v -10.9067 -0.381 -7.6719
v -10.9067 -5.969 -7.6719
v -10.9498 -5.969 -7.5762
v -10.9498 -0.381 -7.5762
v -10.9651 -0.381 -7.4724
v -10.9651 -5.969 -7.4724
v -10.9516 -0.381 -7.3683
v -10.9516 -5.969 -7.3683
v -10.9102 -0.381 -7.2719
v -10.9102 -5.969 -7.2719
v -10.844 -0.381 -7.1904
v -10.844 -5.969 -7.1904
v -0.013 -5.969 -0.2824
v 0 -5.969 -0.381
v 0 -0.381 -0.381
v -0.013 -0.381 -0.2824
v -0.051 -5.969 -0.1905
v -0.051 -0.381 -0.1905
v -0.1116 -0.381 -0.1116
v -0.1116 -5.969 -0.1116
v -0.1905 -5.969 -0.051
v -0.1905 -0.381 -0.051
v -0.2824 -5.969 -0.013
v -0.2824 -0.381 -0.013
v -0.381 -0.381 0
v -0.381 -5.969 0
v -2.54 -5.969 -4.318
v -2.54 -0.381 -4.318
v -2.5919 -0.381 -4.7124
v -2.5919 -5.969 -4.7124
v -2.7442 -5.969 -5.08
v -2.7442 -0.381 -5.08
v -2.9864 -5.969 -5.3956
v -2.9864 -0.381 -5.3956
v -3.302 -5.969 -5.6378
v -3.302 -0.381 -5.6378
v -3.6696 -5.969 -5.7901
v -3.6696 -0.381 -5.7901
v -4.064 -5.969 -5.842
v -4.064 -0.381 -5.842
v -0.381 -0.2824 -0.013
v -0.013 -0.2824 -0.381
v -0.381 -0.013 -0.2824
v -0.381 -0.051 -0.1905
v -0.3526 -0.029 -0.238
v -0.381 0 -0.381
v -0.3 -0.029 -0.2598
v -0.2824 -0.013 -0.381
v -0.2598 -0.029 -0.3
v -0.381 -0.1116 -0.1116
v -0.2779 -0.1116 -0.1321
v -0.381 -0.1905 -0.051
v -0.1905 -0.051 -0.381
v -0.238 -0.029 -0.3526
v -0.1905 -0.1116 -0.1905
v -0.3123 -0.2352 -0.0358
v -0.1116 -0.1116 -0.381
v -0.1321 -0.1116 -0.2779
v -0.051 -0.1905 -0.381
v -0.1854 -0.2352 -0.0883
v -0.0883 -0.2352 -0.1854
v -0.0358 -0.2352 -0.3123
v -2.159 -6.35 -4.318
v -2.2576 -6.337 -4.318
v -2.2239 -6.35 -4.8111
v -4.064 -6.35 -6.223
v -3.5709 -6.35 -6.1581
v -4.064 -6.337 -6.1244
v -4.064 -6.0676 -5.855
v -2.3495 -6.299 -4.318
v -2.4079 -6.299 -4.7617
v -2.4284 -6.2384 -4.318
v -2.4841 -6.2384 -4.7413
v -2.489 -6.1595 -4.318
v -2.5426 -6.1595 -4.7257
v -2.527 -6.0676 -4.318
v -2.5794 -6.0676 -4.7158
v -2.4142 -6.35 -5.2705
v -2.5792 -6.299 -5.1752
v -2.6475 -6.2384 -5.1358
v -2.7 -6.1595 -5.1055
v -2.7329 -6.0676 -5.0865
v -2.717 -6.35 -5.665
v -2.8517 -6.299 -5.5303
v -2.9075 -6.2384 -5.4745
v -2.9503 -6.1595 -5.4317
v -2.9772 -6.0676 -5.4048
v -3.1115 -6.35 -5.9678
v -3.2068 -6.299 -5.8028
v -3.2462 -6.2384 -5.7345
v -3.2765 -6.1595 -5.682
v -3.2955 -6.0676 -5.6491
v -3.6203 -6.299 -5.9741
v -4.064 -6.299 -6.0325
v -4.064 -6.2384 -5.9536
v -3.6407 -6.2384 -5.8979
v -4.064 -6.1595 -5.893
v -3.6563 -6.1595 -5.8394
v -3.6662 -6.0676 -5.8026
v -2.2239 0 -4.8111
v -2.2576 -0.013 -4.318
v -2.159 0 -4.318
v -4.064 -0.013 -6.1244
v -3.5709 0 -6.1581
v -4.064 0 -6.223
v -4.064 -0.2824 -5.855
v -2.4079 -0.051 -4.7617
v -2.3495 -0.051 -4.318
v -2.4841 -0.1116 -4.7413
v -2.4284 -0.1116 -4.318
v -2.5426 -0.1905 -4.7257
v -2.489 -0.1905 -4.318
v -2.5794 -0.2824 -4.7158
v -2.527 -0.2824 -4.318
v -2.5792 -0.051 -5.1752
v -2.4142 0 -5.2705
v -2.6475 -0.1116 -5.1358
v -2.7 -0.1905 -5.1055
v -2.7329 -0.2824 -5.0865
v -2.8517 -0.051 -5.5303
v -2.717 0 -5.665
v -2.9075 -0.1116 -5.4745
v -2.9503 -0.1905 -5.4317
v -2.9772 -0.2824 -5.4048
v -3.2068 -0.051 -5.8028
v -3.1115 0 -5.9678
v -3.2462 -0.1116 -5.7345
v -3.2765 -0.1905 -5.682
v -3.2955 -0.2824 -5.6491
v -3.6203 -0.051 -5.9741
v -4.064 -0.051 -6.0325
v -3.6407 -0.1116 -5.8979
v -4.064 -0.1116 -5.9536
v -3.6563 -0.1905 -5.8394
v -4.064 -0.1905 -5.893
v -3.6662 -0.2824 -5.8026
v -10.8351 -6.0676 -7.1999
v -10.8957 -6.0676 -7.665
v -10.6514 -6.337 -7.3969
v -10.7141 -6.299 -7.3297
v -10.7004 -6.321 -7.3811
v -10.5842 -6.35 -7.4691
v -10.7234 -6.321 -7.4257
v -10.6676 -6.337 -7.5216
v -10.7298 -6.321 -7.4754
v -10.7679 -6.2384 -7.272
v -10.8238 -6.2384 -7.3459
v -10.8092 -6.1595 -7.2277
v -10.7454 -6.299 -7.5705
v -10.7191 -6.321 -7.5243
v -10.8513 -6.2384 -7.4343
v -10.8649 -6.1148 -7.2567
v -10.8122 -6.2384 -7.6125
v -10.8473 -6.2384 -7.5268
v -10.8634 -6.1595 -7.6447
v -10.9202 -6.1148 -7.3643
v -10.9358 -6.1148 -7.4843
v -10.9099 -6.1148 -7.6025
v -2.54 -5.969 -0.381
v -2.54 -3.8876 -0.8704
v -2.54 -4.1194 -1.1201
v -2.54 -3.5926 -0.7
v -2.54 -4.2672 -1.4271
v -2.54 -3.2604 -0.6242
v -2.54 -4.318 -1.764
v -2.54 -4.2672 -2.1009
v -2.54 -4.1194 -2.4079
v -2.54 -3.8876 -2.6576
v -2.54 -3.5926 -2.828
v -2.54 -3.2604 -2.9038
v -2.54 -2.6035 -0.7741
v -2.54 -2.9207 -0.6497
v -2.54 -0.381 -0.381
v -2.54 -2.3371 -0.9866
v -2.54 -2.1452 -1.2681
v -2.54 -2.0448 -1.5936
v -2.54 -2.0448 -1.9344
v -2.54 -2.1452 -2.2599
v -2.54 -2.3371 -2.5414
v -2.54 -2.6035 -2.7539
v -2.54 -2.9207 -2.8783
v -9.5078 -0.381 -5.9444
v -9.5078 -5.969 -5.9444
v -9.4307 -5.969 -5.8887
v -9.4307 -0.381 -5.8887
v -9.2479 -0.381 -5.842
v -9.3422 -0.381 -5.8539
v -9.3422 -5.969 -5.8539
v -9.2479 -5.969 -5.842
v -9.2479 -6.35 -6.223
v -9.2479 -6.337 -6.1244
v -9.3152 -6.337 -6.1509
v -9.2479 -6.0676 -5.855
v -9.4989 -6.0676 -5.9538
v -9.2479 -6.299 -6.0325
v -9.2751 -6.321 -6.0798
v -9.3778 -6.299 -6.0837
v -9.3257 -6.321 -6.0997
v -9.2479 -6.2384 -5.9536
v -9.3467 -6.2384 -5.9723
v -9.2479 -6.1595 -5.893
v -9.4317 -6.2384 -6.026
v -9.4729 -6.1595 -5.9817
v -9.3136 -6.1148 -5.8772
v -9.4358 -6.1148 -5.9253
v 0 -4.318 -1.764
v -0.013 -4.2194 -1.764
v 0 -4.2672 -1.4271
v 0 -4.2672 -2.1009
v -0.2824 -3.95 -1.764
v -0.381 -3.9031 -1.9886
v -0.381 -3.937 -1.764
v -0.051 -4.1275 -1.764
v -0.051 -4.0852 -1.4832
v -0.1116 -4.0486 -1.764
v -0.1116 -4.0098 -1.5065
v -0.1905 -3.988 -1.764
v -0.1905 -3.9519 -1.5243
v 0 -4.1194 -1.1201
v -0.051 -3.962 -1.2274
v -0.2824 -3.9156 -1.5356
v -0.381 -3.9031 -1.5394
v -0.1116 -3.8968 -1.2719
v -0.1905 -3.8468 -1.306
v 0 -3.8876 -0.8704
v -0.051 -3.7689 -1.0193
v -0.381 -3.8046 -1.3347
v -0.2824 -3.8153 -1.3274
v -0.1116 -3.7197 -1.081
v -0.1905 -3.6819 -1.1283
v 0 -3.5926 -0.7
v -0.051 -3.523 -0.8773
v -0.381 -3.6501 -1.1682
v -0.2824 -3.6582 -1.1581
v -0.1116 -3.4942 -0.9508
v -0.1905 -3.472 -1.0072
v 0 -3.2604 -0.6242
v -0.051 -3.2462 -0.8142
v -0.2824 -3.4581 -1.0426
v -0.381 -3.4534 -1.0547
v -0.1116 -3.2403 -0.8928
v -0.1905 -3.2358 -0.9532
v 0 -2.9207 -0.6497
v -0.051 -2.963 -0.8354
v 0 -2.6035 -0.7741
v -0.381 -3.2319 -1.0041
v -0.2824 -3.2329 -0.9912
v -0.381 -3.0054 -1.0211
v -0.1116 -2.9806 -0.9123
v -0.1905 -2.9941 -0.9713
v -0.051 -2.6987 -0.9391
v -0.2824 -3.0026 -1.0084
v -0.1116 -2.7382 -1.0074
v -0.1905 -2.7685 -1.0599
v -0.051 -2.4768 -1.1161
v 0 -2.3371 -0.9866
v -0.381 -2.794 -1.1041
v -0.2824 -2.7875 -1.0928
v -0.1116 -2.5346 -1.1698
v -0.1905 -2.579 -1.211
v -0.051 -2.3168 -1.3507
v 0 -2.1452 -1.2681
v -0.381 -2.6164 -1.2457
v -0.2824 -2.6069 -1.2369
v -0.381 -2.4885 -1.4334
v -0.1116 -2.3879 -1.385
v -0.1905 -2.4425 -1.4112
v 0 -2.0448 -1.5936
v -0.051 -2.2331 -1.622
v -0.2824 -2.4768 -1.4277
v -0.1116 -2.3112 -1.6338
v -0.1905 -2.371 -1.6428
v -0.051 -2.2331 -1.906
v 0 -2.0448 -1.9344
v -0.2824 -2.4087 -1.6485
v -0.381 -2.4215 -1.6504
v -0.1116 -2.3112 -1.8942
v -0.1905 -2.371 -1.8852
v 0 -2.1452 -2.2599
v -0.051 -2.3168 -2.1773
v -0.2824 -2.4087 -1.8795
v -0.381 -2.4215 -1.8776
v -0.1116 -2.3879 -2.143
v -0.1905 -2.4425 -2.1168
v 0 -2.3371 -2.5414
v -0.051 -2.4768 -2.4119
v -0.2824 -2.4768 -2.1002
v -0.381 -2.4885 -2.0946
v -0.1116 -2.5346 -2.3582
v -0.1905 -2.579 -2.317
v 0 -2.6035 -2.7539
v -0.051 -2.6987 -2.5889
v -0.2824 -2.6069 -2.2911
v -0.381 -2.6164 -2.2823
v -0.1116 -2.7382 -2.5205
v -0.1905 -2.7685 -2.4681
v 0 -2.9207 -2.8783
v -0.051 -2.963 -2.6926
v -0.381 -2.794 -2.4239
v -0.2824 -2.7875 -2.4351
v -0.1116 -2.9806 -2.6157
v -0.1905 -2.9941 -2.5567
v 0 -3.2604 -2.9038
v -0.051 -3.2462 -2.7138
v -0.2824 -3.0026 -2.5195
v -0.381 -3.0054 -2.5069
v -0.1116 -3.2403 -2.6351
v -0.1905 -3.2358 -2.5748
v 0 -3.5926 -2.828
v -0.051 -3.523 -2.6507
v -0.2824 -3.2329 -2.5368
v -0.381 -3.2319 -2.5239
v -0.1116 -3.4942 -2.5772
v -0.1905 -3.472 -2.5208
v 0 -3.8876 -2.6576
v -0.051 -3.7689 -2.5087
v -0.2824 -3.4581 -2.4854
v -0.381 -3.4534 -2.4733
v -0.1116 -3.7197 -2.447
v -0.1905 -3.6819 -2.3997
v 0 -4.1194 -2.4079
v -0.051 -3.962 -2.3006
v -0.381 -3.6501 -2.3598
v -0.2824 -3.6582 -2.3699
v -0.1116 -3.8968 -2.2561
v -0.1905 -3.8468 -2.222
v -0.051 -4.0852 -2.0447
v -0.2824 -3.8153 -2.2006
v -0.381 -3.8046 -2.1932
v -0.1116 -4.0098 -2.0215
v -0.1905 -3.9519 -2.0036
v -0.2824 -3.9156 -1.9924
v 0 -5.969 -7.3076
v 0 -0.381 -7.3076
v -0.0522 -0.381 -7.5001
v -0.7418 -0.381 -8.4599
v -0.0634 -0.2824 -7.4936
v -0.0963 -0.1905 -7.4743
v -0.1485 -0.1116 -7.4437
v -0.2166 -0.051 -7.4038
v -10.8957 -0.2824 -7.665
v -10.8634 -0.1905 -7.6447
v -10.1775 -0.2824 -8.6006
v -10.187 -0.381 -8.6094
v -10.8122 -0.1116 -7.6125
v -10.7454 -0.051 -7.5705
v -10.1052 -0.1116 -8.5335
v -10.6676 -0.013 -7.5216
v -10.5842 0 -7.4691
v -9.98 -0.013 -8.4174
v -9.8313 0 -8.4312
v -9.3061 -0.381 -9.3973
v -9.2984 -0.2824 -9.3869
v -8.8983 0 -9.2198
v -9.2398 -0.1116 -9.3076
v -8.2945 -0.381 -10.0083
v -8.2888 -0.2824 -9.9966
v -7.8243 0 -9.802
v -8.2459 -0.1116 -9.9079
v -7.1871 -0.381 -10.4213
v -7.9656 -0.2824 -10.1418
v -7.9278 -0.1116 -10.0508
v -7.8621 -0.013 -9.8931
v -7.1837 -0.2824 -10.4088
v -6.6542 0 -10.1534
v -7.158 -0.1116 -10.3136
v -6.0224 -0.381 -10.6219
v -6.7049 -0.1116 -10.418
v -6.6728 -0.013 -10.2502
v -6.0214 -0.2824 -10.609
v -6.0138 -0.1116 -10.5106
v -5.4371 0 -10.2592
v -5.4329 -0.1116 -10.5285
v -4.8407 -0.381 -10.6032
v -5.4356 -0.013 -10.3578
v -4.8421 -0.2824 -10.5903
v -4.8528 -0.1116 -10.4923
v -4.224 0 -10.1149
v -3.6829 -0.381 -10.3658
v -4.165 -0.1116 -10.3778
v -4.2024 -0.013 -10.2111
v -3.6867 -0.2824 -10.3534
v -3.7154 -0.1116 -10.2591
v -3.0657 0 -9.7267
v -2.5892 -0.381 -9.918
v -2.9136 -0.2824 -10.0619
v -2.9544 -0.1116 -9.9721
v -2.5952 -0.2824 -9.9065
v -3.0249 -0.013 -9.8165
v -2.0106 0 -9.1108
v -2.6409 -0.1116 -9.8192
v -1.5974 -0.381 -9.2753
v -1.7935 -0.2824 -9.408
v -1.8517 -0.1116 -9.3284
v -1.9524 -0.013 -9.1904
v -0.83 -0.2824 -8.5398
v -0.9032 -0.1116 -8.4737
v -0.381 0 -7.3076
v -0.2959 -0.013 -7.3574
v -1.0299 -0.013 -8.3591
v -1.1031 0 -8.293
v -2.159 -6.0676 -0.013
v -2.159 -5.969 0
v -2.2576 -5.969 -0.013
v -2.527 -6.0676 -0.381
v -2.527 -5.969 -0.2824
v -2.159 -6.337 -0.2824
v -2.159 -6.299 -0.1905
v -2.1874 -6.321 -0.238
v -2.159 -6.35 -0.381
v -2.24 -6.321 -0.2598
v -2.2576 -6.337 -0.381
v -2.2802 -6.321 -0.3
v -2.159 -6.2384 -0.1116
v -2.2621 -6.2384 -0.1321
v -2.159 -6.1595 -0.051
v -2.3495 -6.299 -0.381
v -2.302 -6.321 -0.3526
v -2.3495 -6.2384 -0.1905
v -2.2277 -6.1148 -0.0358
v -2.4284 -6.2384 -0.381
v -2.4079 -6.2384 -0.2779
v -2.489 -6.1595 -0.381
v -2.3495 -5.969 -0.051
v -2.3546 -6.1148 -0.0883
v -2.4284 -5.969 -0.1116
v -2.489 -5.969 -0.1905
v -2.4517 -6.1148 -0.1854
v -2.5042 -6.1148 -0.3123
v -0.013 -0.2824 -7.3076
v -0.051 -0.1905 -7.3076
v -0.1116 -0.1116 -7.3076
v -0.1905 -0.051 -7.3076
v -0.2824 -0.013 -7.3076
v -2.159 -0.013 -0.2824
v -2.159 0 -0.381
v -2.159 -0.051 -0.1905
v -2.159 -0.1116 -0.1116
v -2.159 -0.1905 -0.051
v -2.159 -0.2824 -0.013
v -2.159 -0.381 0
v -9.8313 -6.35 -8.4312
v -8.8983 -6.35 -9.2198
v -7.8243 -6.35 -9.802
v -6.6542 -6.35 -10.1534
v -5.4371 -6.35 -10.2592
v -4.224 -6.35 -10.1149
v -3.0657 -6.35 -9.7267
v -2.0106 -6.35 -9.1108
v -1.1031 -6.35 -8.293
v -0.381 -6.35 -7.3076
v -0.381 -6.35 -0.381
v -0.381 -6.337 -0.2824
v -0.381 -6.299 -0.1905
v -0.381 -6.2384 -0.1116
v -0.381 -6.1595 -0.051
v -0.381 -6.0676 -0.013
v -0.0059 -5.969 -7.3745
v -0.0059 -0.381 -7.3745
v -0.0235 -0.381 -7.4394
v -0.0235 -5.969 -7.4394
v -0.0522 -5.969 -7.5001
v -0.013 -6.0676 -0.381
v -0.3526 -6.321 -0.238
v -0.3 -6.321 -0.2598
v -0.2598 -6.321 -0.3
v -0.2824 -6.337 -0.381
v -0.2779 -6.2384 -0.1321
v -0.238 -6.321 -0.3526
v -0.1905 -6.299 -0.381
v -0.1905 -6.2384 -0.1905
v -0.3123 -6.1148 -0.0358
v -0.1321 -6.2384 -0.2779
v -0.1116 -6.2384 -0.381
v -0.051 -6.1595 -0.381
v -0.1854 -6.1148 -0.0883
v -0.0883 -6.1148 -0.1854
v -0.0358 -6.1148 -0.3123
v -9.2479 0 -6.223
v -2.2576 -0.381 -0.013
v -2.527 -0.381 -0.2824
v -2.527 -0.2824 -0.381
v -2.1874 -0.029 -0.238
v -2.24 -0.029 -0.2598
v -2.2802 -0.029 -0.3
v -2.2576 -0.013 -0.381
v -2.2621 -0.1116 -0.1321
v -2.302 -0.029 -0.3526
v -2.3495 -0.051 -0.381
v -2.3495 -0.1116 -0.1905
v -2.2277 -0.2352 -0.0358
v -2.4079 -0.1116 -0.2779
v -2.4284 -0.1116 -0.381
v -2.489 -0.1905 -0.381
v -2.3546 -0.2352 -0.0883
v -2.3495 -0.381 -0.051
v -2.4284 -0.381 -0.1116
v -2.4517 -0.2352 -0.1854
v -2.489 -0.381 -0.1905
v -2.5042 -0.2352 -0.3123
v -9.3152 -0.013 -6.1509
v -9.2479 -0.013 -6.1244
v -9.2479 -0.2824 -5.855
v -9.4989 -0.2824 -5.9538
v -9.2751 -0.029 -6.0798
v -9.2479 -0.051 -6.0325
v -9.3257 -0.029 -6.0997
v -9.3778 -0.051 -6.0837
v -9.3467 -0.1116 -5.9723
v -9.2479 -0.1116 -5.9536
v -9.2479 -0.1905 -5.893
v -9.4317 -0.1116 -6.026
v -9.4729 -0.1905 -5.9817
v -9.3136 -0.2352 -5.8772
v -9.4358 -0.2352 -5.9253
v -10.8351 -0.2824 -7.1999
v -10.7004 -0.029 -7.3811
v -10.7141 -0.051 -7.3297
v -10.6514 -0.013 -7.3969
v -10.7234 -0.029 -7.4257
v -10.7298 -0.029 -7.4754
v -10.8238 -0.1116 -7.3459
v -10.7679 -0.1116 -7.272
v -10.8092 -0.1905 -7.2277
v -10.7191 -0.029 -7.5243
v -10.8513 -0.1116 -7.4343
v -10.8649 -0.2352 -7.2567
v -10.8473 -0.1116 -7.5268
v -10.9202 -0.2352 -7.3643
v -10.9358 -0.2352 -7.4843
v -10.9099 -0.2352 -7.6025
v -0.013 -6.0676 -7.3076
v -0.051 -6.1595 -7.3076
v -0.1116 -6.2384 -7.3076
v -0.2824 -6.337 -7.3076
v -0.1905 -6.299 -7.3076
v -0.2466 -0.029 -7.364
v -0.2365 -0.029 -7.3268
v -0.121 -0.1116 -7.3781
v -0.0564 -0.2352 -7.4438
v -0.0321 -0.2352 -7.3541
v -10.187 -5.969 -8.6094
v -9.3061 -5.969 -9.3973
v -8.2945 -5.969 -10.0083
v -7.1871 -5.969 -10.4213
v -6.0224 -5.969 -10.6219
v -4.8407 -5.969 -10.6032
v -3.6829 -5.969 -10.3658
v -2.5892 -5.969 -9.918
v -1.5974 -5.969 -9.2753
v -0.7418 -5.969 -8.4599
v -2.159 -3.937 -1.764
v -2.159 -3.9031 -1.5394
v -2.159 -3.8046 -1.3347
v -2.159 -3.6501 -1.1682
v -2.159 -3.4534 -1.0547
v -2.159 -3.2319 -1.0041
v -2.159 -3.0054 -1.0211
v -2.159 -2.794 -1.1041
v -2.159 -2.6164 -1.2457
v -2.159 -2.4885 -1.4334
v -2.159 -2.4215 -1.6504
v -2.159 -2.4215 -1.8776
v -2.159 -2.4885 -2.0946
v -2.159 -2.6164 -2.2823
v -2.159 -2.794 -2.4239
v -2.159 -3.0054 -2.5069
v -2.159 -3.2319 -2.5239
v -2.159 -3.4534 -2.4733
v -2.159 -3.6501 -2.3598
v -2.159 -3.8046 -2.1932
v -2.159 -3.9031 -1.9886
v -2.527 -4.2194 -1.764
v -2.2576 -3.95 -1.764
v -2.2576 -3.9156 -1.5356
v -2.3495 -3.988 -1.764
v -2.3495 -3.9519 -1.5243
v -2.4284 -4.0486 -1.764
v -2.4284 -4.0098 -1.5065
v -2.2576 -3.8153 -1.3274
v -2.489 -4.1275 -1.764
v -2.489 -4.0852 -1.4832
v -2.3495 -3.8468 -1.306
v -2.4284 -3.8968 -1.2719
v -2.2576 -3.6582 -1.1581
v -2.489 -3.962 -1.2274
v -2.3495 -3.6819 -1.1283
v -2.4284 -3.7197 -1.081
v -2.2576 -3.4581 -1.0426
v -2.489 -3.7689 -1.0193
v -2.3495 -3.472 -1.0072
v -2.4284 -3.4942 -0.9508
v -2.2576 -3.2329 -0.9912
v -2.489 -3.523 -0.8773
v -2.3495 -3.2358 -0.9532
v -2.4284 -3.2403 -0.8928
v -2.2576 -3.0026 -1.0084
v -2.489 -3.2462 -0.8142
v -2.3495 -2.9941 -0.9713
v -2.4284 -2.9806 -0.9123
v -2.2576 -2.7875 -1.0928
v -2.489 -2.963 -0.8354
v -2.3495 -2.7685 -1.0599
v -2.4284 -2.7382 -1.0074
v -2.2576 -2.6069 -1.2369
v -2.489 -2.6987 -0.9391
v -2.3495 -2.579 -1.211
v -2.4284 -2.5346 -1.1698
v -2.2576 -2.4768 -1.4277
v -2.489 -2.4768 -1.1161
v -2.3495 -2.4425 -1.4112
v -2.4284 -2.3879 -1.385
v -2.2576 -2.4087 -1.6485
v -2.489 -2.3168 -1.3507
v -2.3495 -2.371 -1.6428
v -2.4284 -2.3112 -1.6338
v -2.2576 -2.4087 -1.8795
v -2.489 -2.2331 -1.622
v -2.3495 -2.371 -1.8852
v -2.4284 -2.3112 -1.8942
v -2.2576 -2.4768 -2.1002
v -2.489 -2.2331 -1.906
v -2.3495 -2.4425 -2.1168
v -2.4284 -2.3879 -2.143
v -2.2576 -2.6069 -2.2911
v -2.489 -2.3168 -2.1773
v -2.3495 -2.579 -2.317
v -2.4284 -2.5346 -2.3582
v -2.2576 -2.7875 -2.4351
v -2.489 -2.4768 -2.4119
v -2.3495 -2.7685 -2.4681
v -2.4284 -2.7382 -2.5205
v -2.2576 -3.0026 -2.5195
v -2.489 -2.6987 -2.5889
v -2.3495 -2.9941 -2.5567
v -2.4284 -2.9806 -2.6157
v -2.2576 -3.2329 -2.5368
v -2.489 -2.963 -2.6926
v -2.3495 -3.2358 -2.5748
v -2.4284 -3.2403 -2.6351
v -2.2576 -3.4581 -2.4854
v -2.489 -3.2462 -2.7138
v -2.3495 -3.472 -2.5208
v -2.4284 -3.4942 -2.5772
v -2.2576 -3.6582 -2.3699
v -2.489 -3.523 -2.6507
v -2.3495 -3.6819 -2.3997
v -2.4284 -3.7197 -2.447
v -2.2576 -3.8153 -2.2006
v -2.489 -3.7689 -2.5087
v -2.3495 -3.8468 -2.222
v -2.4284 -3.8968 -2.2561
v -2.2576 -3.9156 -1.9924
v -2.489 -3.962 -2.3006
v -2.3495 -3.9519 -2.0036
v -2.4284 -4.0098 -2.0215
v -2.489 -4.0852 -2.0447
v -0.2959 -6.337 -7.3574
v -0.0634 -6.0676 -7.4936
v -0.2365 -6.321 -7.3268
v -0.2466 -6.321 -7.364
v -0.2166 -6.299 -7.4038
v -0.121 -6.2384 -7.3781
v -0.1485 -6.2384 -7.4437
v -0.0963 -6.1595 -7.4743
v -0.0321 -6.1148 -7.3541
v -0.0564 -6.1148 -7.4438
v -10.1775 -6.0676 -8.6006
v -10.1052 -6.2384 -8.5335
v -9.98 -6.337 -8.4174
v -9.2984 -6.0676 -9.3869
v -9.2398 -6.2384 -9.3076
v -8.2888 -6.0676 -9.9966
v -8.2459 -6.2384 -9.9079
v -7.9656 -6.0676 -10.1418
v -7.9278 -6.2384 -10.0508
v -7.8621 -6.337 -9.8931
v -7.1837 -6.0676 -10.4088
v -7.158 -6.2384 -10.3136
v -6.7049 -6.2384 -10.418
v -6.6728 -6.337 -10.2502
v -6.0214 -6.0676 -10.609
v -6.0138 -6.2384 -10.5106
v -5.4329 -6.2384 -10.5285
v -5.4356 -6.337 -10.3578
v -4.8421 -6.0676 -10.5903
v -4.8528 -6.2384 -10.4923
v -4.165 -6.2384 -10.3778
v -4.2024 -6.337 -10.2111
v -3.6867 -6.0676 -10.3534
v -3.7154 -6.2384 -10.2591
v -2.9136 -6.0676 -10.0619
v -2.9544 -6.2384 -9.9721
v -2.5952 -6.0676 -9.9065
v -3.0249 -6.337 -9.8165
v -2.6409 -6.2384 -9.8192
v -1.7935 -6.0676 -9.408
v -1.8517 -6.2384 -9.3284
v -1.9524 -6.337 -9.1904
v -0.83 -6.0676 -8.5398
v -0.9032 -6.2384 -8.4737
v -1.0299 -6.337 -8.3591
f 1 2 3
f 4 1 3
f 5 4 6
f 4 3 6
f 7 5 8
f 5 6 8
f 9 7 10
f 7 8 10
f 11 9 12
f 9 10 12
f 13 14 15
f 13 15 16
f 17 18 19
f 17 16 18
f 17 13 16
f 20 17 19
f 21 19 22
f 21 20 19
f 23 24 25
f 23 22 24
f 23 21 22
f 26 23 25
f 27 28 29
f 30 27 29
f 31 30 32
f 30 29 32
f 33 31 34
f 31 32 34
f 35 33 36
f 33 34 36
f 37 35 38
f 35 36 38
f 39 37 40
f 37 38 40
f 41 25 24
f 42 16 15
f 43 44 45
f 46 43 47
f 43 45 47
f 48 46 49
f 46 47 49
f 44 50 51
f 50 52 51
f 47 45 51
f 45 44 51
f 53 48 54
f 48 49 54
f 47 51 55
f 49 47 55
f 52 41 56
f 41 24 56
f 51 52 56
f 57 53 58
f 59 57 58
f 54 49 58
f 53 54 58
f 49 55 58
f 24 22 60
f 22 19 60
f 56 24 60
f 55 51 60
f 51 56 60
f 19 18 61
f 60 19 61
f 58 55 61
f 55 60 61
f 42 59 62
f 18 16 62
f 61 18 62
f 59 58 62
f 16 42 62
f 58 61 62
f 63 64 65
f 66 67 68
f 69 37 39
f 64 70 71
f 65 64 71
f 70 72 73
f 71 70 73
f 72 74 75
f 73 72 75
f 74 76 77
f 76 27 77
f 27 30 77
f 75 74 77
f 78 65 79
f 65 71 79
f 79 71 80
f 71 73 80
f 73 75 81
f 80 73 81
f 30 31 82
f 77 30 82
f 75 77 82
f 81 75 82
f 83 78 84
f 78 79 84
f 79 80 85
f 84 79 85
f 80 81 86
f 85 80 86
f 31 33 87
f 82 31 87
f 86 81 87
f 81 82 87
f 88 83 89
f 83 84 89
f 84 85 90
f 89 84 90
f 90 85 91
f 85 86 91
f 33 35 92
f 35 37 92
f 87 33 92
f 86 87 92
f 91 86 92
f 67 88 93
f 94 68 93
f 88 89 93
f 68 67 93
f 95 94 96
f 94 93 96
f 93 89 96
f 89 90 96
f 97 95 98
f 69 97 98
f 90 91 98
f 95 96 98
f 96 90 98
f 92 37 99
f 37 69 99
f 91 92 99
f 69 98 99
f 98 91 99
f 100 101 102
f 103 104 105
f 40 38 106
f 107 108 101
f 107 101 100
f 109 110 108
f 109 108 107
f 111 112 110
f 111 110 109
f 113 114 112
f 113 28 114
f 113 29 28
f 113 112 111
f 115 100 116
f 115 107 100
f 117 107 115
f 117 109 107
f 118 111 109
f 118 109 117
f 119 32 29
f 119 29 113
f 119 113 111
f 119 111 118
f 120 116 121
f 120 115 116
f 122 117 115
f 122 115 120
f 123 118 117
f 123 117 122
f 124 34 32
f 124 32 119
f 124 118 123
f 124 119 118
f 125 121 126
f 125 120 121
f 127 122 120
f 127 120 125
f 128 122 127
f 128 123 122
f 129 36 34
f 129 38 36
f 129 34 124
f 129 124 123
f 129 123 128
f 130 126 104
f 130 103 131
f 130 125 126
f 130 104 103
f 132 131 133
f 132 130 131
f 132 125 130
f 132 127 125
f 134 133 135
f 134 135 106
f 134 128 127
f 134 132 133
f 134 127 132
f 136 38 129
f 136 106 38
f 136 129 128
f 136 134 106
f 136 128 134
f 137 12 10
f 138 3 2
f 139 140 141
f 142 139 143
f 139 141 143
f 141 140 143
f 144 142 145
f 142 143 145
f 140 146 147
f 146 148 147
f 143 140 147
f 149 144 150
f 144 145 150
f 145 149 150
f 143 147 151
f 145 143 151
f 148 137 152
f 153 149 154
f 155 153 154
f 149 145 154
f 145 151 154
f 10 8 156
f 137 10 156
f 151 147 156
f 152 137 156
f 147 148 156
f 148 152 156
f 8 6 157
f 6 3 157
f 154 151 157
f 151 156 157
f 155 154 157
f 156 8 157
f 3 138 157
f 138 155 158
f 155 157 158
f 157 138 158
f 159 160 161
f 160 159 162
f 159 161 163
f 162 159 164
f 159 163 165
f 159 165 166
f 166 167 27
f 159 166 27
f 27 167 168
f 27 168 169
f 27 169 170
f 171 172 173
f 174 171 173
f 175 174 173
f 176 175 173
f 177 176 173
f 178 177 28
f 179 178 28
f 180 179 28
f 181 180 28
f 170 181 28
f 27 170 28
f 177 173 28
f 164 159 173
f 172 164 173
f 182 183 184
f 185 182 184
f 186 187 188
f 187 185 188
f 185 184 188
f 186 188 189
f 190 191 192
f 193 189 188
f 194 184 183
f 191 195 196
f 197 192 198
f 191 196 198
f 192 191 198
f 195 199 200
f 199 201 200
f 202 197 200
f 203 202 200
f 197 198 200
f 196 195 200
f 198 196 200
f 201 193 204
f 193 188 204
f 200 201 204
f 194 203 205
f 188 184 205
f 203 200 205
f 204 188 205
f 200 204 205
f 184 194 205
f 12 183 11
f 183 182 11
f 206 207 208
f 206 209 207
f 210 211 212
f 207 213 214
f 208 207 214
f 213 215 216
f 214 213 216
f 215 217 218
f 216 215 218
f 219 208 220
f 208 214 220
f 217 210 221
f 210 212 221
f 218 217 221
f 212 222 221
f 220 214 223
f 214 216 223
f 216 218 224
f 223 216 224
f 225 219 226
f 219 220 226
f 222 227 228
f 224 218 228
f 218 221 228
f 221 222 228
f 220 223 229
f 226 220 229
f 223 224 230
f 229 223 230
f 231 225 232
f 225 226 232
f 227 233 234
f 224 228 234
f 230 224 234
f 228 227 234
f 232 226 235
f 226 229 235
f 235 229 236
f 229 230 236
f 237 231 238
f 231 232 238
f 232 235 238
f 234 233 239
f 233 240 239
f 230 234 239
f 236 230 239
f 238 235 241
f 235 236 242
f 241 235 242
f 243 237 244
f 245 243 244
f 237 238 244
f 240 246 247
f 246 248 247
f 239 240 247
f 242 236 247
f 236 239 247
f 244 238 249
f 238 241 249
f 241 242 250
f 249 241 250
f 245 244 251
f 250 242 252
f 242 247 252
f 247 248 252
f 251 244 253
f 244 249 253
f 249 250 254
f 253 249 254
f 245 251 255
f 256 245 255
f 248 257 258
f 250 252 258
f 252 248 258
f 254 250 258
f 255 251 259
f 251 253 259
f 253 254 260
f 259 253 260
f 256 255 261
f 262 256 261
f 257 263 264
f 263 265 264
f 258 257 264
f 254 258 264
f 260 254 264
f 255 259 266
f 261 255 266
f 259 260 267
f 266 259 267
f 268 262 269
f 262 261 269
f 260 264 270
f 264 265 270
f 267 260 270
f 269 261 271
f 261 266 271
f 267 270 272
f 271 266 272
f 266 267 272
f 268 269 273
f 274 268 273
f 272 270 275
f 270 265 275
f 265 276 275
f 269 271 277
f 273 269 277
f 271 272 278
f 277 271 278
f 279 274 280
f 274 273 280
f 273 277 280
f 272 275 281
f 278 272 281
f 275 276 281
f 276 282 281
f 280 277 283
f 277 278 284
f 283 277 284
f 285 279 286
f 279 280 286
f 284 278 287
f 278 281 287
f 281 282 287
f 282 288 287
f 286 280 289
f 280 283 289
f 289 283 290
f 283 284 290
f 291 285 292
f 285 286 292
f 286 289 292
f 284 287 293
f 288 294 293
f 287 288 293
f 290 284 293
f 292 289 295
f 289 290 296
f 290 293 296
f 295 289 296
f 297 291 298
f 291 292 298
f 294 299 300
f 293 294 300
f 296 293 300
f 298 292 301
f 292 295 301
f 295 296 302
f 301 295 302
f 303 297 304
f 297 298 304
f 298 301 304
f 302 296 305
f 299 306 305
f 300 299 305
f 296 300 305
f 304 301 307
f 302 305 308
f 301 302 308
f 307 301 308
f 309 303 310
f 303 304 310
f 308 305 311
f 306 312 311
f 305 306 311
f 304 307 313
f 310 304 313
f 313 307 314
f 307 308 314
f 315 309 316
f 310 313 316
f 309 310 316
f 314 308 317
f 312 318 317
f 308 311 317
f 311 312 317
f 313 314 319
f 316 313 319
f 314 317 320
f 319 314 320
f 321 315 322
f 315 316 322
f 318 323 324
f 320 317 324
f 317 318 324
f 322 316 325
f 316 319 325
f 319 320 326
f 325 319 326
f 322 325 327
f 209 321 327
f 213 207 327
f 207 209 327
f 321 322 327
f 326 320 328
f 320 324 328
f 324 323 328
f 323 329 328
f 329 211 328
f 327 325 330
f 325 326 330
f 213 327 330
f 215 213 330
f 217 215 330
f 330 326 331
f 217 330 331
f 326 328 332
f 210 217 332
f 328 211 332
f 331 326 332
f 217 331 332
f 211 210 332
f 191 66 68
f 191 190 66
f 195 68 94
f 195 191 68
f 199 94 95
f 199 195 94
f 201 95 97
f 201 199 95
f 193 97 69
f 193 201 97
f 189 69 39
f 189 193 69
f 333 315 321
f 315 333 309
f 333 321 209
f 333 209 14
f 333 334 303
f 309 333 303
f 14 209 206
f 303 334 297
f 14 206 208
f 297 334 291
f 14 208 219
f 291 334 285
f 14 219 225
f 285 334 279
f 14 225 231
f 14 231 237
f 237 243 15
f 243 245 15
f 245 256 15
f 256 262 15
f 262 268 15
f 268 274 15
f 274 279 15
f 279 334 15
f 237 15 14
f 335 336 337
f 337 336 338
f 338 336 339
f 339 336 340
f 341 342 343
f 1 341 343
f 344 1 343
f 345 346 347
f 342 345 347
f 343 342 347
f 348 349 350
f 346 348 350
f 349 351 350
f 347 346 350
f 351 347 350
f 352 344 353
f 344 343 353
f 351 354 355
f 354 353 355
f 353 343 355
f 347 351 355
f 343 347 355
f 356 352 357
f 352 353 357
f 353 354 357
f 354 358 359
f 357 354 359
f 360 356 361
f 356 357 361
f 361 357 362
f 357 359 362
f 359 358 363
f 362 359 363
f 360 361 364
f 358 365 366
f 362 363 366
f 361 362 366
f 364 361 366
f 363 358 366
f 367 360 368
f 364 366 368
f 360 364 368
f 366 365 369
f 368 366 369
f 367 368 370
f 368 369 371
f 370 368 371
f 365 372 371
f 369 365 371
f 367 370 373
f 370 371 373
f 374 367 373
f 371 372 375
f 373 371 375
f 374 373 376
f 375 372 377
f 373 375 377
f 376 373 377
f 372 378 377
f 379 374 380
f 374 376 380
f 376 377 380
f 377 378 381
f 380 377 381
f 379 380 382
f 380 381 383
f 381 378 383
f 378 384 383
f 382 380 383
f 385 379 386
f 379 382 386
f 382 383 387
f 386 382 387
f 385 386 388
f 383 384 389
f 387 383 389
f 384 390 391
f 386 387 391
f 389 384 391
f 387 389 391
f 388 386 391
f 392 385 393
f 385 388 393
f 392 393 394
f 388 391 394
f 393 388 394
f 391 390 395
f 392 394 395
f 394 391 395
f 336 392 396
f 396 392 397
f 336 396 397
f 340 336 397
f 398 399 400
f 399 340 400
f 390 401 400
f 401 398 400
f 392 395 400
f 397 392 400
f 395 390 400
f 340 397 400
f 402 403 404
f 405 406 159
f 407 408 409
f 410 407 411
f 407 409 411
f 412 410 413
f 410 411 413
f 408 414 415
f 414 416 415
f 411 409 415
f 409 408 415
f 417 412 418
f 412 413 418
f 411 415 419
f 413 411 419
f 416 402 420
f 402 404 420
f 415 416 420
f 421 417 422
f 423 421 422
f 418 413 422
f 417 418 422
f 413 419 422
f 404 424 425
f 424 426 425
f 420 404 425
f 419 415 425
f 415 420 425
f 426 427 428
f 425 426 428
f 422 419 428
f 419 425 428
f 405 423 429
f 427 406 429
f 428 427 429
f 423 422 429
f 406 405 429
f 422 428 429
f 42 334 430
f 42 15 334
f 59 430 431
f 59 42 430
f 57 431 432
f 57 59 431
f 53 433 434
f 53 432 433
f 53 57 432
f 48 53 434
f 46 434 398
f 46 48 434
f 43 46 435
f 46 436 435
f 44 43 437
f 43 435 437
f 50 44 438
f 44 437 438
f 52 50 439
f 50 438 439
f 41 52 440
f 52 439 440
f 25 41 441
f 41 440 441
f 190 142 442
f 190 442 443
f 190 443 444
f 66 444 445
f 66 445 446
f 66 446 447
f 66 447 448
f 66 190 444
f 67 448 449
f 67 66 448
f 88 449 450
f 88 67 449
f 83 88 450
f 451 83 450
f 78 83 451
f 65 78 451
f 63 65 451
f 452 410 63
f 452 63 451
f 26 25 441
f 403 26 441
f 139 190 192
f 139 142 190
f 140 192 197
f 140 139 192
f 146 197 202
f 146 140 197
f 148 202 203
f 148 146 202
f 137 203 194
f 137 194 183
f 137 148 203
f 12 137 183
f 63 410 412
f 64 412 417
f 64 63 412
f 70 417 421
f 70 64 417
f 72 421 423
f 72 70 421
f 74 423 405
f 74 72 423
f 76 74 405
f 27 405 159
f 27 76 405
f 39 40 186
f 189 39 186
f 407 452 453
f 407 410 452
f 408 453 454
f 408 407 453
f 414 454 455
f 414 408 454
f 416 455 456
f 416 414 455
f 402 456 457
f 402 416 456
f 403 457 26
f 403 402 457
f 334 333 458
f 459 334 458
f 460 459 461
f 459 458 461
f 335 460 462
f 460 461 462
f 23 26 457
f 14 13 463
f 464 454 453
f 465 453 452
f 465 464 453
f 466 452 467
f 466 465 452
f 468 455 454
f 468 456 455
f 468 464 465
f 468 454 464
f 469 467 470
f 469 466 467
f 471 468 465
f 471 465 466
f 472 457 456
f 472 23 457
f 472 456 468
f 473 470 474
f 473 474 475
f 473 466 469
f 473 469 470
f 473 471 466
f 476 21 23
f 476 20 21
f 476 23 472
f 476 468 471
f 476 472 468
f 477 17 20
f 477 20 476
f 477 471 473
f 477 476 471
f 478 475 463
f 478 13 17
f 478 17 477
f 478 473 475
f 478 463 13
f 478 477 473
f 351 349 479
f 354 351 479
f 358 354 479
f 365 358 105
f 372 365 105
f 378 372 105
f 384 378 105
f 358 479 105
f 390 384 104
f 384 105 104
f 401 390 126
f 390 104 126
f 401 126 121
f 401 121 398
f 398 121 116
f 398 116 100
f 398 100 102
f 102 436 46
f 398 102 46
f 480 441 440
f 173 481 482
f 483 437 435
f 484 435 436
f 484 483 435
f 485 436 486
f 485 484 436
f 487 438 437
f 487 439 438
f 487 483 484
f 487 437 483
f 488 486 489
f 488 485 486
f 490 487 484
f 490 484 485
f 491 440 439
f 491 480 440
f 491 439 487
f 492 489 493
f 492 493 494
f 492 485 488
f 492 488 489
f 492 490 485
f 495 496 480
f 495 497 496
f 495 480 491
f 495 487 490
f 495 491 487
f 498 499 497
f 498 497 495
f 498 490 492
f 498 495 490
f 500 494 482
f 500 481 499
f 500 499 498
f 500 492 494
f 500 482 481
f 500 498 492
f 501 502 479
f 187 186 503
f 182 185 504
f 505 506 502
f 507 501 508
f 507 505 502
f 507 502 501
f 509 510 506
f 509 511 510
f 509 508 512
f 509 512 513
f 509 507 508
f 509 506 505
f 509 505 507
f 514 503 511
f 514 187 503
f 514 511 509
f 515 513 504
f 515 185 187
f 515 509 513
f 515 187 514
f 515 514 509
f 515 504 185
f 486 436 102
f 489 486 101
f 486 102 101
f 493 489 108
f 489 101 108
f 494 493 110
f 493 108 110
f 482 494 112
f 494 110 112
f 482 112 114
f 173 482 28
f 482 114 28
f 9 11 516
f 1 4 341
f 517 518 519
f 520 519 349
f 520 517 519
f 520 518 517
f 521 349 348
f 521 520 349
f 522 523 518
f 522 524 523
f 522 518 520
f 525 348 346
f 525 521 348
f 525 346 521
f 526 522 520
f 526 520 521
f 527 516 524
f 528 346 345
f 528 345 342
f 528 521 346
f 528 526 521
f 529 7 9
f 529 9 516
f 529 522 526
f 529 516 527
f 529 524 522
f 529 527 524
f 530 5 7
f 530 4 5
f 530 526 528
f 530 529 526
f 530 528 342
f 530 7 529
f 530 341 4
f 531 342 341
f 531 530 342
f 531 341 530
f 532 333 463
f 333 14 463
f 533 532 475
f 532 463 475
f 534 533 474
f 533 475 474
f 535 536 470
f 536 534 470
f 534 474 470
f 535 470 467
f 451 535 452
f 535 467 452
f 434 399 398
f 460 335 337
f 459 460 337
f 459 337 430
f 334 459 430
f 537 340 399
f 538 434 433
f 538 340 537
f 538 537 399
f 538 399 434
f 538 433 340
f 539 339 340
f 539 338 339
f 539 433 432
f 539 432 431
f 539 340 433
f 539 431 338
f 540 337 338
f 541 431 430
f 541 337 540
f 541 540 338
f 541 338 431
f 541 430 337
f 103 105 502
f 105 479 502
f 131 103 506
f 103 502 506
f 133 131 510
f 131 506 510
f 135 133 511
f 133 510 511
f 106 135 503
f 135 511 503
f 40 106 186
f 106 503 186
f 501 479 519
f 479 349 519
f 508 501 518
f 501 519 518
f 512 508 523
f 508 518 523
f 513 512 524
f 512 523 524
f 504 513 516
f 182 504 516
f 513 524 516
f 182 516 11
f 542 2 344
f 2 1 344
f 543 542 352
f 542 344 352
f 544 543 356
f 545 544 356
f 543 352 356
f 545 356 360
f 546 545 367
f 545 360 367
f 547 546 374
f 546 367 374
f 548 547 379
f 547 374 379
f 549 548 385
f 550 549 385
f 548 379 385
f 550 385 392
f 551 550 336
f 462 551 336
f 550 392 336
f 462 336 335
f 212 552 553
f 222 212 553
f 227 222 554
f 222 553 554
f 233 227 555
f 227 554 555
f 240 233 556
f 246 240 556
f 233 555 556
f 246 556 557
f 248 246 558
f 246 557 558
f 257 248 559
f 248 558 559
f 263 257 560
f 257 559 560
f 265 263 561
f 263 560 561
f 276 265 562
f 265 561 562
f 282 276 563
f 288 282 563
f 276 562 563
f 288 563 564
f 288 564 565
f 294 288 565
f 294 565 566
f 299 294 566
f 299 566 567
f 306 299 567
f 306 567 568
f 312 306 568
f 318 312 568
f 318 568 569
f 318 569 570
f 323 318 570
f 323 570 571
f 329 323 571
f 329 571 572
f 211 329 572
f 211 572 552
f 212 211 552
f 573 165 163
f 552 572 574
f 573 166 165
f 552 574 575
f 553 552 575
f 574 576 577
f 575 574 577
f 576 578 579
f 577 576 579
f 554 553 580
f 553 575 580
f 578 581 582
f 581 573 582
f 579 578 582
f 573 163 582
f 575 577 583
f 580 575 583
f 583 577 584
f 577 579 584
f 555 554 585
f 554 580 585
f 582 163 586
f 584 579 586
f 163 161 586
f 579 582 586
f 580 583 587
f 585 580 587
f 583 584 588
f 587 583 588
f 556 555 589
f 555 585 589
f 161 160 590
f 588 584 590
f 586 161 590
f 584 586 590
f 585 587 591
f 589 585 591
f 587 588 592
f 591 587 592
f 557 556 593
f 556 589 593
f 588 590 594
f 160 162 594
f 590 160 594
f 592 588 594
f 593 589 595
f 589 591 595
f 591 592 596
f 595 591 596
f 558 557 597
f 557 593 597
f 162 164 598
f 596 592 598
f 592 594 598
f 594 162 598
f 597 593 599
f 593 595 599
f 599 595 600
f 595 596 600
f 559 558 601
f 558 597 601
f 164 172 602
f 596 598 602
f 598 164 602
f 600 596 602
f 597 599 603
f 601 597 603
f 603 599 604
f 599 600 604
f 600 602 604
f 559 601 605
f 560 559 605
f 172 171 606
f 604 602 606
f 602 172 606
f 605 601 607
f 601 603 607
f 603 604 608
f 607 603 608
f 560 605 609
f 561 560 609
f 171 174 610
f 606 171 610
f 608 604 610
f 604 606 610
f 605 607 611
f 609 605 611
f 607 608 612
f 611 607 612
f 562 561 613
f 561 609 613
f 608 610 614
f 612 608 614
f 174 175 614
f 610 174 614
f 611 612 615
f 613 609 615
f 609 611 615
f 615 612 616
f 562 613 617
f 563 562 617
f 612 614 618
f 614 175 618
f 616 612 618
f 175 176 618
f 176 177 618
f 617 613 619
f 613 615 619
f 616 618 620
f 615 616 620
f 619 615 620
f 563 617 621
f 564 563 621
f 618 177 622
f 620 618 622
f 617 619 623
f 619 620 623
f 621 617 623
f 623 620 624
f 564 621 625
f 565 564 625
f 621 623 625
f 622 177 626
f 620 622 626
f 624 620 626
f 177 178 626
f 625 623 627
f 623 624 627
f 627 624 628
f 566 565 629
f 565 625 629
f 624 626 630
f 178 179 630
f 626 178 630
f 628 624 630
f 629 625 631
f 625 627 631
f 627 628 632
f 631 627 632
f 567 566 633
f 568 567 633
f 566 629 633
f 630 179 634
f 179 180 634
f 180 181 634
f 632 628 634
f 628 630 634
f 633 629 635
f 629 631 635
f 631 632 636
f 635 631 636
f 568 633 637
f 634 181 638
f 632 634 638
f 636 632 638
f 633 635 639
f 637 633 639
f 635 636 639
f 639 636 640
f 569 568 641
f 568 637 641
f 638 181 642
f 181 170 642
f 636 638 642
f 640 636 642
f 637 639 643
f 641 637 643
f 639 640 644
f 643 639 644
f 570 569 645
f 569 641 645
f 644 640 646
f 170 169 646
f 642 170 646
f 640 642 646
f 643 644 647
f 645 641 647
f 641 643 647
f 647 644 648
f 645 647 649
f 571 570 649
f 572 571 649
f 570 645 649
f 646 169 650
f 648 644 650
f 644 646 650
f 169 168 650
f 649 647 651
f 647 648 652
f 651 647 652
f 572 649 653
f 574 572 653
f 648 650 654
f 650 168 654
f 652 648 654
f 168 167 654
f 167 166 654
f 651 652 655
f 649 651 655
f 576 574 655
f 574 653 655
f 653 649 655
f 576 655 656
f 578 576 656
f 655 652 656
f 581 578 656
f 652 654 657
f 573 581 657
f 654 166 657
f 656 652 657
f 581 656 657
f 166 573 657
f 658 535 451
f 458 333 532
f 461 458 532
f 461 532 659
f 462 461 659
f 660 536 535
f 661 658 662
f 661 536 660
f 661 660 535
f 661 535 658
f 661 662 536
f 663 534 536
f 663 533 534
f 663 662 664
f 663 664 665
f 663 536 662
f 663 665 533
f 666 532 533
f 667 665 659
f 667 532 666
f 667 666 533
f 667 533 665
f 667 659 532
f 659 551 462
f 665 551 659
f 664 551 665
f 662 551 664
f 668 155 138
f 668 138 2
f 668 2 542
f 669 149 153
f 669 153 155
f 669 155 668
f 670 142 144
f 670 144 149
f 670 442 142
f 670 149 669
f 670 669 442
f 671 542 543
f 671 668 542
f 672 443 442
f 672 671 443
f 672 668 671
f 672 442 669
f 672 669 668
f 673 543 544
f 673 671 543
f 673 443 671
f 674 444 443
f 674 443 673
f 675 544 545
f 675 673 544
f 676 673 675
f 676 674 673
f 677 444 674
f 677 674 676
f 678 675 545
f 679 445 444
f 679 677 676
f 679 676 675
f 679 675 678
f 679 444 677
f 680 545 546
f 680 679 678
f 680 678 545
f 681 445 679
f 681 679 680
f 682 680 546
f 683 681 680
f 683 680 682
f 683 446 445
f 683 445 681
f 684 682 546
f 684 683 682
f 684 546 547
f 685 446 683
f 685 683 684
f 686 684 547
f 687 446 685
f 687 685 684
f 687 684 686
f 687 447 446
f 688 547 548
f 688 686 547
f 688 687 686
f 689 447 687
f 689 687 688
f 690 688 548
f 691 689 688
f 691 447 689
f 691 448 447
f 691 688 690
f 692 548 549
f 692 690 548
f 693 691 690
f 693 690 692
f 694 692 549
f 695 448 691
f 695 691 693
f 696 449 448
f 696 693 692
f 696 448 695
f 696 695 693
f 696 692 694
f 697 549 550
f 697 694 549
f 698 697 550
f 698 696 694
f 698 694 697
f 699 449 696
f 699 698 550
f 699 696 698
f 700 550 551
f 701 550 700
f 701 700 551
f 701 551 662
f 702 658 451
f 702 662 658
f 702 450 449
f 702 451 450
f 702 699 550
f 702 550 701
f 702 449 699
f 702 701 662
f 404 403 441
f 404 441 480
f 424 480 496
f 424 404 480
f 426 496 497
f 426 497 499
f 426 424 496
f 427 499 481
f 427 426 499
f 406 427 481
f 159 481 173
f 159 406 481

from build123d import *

# Parameters (mm, degrees)
F1_DEPTH = 6.35
F3_D     = 1.524
F4_R     = 0.381


with BuildPart() as f1:
    # F0 (on Front) → F1 (new body)
    with BuildSketch(Plane.XZ):
        with BuildLine():
            Line((0, -7.4092204591), (0, 0))
            Line((0, 0), (-2.54, 0))
            Line((-2.54, 0), (-2.54, -4.318))
            ThreePointArc((-2.54, -4.318), (-2.9863692655, -5.3956307345), (-4.064, -5.842))
            Line((-4.064, -5.842), (-9.398, -5.842))
            Line((-9.398, -5.842), (-11.068511021, -7.3997767286))
            ThreePointArc((-11.068511021, -7.3997767286), (-5.53701683, -10.6408992323), (0, -7.4092204591))
        make_face()
    extrude(amount=F1_DEPTH)

    # F3 (through all)
    with Locations(Plane.YZ):
        with Locations((-3.175, -1.7639952663)):
            Hole(F3_D / 2)

    # F4
    f4_edges = [f1.edges().sort_by_distance(p)[0] for p in [
        (-2.54, -3.175, 0),
        (0, -3.175, 0),
        (-1.27, -6.35, 0),
        (-1.27, 0, 0),
        (0, -6.35, -3.70461),
        (-2.54, -6.35, -2.159),
        (-2.986369, -6.35, -5.395631),
        (-6.731, -6.35, -5.842),
        (-10.233256, -6.35, -6.620888),
        (-5.537017, -6.35, -10.640899),
        (0, -3.175, -7.40922),
        (-9.398, -3.175, -5.842),
        (-2.54, 0, -2.159),
        (-2.986369, 0, -5.395631),
        (-6.731, 0, -5.842),
        (-10.233256, 0, -6.620888),
        (-5.537017, 0, -10.640899),
        (0, 0, -3.70461),
        (-11.068511, -3.175, -7.399777),
        (0, -3.937, -1.763995),
        (-2.54, -3.937, -1.763995),
    ]]
    fillet(f4_edges, radius=F4_R)


solid = f1.part
